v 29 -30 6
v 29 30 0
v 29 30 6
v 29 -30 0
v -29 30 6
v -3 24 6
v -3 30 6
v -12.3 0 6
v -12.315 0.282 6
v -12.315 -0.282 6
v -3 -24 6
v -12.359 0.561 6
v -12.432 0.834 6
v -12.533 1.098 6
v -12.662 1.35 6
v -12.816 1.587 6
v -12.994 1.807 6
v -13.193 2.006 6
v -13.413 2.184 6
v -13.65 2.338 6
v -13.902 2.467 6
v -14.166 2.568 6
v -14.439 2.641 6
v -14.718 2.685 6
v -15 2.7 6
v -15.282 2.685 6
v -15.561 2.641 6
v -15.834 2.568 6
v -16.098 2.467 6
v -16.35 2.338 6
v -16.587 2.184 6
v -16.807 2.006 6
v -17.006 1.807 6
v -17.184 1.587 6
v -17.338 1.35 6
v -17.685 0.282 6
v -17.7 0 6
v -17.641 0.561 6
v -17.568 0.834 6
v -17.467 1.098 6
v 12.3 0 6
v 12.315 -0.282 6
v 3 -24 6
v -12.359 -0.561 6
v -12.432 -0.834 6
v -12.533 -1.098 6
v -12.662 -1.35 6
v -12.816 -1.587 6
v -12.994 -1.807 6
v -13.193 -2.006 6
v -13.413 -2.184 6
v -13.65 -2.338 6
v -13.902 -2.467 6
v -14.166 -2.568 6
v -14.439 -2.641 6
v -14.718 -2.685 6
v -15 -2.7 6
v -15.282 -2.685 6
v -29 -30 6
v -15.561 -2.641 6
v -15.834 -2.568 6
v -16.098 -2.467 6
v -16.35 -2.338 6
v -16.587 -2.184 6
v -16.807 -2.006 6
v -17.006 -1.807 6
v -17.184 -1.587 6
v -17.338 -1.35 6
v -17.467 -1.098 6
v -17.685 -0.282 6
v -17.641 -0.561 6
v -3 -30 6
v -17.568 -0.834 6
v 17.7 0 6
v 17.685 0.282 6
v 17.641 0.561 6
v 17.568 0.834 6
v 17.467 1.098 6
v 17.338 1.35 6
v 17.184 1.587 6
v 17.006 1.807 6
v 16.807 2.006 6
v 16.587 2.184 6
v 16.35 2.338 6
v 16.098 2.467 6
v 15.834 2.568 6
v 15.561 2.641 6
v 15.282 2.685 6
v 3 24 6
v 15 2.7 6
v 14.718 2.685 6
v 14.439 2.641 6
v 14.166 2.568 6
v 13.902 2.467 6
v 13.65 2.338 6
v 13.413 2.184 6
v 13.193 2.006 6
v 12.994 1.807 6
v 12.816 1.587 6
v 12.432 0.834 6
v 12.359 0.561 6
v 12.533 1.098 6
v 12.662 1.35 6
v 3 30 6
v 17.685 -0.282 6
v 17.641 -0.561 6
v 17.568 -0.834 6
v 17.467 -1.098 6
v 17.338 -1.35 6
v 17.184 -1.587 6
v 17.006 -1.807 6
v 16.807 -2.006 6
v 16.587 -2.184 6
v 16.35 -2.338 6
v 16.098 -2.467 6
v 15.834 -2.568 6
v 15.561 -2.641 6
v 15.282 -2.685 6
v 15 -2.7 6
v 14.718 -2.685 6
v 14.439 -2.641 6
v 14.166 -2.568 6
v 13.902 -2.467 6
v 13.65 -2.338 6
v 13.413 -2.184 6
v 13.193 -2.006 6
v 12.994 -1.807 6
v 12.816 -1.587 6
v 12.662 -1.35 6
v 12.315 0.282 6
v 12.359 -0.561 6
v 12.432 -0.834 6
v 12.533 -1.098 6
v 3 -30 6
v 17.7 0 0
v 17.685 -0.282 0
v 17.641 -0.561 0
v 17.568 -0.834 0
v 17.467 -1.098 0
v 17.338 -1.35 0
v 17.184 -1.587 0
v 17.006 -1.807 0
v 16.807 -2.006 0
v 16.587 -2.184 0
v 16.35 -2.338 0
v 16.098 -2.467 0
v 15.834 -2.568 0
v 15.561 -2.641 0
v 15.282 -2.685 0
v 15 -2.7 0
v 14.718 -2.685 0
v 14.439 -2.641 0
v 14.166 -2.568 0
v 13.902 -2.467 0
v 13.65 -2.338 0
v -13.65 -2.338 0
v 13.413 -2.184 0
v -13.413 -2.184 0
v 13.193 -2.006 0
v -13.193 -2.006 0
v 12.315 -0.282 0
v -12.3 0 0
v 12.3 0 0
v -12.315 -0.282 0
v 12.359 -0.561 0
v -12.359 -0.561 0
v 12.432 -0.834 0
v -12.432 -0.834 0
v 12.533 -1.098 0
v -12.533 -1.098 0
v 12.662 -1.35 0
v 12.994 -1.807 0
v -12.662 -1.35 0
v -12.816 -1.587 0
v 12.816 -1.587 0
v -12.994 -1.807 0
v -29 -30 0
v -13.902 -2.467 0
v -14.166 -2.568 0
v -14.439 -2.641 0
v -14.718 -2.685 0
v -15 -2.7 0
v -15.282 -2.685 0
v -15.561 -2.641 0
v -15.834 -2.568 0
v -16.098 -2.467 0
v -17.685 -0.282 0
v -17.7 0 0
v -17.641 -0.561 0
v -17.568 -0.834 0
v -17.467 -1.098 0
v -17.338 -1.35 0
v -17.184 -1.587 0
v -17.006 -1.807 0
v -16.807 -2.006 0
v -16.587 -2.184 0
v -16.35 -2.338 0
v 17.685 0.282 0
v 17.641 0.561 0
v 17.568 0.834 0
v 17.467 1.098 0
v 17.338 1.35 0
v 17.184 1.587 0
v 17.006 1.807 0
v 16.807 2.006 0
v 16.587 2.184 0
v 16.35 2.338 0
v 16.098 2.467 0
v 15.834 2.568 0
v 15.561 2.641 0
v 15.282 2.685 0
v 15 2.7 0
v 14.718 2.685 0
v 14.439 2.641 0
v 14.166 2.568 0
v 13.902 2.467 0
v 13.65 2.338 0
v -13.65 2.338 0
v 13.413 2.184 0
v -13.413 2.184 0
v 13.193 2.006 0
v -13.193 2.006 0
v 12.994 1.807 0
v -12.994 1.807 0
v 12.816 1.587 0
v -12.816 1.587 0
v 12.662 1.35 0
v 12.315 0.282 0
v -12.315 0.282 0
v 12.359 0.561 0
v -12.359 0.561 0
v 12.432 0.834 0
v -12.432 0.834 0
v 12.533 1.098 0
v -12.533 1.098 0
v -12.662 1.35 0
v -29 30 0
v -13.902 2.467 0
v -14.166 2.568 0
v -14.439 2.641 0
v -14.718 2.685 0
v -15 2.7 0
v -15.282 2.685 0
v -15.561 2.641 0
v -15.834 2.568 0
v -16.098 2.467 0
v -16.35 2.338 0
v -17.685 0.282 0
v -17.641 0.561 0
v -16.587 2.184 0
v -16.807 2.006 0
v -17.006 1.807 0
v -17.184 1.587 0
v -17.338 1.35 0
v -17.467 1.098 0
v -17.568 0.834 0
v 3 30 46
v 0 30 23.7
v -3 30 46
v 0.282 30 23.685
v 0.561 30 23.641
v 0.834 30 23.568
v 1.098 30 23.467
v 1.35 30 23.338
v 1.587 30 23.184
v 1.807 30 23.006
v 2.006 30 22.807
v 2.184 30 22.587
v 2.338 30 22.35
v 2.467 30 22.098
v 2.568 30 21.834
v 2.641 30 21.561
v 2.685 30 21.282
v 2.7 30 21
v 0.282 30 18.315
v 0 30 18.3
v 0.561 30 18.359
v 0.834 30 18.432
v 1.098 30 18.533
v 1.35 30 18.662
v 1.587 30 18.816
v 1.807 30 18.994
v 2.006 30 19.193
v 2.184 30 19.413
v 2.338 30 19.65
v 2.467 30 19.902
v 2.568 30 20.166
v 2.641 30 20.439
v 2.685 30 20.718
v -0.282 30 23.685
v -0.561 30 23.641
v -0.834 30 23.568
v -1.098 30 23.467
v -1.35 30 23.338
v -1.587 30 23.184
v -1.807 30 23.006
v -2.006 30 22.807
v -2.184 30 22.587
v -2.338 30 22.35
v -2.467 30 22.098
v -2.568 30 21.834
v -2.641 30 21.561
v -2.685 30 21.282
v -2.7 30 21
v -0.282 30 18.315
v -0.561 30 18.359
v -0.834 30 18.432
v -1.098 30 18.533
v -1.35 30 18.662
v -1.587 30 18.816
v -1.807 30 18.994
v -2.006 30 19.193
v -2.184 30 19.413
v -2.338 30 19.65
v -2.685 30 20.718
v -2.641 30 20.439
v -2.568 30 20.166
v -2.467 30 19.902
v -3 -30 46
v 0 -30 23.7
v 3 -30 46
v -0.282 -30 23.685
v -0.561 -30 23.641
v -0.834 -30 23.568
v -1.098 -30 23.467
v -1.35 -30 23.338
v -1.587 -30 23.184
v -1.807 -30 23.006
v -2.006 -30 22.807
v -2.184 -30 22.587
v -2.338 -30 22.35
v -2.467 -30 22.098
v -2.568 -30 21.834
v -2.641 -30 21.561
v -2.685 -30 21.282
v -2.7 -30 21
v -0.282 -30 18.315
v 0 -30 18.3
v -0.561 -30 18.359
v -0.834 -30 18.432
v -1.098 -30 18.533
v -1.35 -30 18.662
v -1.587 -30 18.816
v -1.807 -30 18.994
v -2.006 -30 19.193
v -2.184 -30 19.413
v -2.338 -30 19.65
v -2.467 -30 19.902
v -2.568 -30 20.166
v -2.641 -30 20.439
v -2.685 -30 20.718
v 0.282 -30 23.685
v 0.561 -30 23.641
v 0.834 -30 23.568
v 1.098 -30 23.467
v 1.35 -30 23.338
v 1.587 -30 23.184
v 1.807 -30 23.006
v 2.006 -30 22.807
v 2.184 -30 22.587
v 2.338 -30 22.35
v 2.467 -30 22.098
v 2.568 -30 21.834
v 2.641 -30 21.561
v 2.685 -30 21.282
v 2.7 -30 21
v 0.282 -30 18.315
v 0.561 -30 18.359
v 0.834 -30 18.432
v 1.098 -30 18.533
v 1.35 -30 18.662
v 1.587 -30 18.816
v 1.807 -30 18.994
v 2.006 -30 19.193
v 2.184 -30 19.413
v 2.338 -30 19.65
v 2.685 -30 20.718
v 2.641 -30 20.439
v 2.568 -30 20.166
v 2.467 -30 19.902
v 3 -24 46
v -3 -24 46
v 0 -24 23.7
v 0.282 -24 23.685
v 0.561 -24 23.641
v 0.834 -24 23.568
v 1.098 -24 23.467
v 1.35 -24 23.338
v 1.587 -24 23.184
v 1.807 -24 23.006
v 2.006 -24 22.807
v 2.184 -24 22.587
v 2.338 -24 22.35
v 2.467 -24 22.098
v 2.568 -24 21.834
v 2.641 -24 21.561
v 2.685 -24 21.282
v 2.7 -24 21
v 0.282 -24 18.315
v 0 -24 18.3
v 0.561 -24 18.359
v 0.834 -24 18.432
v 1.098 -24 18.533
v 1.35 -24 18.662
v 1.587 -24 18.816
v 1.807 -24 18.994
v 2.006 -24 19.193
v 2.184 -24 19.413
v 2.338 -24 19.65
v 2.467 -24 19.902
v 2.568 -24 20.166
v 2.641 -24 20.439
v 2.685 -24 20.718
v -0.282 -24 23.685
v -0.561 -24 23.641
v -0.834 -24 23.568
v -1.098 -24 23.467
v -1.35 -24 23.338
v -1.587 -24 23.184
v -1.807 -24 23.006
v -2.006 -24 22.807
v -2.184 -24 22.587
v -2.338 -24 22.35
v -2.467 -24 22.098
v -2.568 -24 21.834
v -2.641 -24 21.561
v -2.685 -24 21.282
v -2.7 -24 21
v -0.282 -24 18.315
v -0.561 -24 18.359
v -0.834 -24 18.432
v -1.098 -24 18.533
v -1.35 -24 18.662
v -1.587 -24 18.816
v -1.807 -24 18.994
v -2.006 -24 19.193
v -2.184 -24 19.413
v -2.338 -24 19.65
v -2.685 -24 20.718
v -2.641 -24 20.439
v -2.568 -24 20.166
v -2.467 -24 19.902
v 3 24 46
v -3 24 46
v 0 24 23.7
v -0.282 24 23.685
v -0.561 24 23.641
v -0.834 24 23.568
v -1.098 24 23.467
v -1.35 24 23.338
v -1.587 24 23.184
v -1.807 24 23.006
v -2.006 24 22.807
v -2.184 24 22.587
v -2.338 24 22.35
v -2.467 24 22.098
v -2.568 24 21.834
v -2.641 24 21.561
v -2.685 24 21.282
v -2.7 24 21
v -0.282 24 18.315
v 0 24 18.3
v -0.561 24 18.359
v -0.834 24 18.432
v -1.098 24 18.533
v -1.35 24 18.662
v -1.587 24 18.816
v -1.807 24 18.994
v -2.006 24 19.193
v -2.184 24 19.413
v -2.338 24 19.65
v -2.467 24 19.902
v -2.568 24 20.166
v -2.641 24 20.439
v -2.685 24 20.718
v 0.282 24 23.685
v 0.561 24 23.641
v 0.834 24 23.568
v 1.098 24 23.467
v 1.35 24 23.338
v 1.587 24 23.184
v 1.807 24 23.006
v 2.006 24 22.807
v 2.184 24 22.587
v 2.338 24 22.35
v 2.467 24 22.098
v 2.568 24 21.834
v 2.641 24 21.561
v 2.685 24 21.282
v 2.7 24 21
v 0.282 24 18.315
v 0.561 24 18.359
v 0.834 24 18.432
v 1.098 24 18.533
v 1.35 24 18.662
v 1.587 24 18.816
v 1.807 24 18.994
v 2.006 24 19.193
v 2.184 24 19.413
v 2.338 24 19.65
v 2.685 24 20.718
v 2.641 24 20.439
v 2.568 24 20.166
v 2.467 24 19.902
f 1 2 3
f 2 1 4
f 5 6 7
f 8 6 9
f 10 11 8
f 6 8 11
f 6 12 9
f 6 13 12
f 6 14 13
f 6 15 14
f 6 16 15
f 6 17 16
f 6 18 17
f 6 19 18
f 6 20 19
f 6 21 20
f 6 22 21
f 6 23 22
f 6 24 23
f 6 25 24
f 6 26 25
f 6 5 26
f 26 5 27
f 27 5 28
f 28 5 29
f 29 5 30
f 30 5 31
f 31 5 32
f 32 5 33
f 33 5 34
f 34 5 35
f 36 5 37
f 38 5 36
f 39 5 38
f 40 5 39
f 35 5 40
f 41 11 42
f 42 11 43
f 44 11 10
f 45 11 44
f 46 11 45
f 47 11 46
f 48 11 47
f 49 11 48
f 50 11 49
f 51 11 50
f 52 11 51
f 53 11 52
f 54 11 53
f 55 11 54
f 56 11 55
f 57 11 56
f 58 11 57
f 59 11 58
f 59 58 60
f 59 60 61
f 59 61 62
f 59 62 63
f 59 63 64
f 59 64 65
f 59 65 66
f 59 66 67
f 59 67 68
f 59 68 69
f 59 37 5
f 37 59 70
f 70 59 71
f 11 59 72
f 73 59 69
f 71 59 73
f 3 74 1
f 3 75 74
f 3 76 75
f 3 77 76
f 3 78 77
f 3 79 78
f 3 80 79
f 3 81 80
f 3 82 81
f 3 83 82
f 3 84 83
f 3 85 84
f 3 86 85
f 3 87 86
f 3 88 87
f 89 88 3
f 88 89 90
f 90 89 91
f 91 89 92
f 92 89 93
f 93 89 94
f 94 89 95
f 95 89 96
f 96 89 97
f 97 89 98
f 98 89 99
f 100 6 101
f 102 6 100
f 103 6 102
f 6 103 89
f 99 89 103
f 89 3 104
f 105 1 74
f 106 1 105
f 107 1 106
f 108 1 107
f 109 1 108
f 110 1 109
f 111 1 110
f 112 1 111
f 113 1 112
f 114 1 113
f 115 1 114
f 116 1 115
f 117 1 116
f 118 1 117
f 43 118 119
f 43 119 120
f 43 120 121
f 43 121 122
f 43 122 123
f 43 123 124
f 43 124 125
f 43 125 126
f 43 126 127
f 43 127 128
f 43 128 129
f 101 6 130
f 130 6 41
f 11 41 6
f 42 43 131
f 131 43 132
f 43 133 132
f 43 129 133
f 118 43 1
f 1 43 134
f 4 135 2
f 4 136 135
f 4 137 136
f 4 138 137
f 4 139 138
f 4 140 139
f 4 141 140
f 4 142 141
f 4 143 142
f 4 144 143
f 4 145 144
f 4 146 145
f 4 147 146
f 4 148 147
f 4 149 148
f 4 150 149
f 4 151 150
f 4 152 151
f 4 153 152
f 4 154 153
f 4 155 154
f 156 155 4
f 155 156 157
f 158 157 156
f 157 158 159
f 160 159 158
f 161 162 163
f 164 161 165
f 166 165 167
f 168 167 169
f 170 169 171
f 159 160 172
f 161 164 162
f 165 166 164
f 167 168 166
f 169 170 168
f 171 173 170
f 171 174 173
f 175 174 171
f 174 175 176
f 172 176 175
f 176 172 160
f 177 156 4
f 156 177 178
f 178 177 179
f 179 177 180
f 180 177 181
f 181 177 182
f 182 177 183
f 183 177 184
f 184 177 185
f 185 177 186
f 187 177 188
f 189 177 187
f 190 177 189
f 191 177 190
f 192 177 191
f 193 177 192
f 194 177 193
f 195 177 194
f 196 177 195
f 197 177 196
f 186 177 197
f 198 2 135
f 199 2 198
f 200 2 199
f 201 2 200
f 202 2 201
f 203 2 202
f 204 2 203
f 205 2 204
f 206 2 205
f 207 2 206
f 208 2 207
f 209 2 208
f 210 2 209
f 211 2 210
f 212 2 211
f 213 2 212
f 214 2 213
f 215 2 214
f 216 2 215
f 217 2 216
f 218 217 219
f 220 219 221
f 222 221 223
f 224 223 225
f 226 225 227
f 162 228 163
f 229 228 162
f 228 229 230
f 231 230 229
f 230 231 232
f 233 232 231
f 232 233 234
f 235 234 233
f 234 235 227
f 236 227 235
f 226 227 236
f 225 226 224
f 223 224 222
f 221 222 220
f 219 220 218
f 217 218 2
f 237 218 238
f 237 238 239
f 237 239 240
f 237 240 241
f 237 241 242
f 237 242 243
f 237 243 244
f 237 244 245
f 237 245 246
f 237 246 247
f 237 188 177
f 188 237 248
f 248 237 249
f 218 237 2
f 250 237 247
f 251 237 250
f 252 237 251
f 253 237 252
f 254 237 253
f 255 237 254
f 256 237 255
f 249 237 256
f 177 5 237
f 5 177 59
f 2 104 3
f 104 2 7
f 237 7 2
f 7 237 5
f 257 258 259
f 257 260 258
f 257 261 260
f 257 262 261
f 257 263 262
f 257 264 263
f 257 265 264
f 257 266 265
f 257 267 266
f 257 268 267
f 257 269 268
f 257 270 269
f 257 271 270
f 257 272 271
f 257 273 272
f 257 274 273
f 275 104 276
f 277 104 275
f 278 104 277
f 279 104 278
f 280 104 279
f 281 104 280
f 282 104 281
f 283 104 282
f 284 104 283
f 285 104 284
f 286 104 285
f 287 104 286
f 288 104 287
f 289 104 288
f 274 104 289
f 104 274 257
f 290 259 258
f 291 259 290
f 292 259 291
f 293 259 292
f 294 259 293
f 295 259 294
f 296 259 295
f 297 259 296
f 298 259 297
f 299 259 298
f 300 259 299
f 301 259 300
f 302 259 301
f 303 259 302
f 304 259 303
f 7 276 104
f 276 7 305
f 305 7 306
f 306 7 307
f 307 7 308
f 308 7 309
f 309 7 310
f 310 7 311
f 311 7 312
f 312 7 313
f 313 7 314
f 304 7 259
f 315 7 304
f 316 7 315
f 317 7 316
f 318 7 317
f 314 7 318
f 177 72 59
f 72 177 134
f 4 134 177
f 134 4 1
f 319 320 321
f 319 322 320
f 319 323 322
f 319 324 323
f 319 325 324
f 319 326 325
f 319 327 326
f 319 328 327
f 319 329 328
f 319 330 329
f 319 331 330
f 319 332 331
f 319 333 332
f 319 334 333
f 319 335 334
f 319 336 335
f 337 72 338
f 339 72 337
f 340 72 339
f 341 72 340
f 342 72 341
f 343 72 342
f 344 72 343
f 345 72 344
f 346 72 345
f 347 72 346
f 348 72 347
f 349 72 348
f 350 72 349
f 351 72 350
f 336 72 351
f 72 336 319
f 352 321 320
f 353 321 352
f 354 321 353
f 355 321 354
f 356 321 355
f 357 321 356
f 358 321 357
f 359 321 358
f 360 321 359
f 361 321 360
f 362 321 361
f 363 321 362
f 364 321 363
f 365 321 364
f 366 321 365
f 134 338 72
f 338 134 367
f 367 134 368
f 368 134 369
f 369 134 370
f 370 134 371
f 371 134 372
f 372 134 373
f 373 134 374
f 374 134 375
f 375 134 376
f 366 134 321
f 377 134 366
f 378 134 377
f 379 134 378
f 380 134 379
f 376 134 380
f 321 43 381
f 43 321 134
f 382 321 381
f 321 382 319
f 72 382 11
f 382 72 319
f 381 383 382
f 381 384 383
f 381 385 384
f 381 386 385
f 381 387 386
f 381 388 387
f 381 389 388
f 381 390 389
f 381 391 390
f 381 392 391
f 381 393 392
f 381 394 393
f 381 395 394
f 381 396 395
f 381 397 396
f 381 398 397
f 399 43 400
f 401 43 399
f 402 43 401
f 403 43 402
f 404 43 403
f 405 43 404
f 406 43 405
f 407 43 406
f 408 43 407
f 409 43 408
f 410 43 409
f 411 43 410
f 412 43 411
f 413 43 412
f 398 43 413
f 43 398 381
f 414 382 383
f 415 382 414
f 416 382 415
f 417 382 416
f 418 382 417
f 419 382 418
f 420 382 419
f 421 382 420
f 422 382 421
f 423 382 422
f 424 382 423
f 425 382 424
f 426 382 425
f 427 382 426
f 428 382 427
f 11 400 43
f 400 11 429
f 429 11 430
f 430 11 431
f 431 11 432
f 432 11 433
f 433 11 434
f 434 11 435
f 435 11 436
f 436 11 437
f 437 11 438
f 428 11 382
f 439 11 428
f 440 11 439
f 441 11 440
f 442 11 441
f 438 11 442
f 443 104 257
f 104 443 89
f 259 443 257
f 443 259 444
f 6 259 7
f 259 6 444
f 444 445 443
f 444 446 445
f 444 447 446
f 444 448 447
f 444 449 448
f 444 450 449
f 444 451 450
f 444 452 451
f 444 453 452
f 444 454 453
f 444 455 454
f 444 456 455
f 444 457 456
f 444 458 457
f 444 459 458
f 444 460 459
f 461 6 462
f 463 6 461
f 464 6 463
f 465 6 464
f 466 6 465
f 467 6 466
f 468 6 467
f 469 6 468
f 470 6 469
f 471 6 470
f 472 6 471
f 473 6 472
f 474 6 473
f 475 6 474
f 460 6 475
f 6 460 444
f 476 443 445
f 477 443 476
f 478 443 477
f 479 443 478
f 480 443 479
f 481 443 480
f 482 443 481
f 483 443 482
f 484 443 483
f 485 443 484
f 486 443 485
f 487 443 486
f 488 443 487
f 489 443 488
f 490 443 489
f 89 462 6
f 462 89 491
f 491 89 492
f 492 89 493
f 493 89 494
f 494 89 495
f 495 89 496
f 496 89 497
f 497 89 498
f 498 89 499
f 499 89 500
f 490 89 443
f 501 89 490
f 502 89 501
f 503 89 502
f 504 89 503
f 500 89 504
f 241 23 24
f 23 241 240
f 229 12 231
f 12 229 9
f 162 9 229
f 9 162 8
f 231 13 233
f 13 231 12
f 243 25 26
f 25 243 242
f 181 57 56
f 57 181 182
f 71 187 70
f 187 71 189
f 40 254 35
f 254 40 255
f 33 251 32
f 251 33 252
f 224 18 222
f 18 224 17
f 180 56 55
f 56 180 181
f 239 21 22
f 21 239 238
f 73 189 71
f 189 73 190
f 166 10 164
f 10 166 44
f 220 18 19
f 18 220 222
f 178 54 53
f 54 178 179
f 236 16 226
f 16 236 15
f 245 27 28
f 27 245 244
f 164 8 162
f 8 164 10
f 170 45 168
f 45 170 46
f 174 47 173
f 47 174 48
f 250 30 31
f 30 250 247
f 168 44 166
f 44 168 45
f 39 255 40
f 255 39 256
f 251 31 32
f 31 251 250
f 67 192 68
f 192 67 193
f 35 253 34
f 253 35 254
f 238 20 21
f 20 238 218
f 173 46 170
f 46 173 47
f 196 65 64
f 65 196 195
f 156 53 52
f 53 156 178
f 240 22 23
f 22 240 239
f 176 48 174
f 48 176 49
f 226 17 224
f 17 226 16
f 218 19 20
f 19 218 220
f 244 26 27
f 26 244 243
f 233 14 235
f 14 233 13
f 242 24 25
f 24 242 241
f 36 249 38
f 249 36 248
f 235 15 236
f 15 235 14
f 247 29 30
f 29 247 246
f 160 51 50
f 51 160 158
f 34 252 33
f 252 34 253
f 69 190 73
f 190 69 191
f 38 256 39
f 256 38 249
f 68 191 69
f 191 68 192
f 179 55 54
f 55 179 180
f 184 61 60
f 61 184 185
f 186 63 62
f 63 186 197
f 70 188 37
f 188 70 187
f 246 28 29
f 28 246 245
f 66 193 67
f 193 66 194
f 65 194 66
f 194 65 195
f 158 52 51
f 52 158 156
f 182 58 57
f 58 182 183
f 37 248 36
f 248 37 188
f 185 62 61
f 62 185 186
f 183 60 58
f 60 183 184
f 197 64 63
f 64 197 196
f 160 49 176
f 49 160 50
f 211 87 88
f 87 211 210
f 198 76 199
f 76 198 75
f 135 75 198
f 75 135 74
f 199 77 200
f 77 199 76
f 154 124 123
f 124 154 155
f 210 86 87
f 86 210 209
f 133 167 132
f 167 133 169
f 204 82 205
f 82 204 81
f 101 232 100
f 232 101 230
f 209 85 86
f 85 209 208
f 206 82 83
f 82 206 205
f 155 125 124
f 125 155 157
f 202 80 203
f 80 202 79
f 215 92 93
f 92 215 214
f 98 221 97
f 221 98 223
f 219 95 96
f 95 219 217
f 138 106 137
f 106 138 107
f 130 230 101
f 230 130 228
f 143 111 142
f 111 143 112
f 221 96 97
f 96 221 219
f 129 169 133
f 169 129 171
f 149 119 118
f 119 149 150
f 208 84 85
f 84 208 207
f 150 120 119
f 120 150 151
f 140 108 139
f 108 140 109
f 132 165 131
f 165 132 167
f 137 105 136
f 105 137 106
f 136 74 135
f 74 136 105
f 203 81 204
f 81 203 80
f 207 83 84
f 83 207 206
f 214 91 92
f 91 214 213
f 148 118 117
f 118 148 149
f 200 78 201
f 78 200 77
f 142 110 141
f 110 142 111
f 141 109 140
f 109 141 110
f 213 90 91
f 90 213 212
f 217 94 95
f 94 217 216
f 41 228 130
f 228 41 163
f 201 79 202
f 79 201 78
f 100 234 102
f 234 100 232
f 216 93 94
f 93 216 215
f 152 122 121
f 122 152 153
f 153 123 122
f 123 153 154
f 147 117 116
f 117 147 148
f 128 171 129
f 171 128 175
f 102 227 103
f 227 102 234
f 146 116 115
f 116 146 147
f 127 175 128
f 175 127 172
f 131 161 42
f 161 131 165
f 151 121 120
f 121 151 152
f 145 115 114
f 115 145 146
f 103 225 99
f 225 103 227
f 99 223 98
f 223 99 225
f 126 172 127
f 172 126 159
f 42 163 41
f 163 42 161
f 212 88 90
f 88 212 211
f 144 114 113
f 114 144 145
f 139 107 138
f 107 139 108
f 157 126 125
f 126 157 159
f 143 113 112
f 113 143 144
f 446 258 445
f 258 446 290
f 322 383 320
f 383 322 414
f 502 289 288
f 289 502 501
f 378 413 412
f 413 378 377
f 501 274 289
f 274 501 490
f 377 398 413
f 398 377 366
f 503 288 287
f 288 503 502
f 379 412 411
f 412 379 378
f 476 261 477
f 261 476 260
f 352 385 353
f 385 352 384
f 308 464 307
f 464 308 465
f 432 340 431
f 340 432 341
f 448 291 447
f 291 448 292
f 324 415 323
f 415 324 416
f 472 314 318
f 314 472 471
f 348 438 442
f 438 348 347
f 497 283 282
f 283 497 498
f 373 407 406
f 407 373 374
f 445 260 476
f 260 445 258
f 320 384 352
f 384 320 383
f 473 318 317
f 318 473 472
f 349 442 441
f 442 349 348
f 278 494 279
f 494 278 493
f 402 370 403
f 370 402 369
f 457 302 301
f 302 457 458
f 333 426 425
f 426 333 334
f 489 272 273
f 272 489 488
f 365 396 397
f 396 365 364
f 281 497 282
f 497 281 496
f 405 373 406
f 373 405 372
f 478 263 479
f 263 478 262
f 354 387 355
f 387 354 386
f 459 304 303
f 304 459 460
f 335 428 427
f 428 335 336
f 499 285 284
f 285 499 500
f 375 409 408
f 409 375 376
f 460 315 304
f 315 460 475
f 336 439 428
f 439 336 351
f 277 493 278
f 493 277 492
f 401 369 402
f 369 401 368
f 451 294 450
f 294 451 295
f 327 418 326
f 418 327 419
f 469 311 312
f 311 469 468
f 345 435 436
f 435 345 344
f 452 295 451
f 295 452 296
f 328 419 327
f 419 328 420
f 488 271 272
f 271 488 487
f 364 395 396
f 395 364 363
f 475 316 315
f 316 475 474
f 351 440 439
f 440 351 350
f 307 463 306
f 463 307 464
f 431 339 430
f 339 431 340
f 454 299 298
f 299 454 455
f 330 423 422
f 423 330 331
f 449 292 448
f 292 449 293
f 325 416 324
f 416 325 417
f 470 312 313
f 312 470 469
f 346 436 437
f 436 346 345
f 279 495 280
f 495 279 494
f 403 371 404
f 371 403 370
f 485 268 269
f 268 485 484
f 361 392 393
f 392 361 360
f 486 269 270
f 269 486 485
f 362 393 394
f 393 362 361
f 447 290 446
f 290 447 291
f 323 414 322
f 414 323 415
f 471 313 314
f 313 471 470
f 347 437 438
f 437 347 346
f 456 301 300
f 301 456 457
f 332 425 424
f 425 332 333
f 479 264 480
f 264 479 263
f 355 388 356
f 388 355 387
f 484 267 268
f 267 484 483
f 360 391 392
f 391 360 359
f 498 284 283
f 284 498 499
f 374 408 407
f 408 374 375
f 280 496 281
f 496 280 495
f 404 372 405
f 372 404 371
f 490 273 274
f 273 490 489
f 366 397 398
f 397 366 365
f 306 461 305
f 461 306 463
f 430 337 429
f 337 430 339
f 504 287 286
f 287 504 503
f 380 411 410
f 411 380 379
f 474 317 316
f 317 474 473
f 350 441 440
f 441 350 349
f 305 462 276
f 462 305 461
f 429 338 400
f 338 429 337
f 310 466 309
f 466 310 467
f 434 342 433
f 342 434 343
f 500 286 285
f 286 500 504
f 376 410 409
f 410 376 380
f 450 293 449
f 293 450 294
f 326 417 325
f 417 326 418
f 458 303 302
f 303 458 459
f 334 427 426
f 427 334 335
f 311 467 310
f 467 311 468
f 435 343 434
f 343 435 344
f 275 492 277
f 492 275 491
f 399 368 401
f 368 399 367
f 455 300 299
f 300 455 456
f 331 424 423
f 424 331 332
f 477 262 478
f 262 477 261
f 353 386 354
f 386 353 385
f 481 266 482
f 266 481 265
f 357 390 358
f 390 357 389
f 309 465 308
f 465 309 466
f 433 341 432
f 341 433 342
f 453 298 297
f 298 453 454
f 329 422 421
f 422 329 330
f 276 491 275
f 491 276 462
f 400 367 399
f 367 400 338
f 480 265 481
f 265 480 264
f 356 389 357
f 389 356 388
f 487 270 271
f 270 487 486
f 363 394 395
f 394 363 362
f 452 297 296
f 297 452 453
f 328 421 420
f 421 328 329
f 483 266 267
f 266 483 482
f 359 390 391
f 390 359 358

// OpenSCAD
// Clevis mounting bracket for M5 pin.
$fn = 60;
eps = 0.02;
opening = 48;
ear_h = 42;
base_l = 58;
base_w = opening + 12;
base_t = 6;
ear_t = 6;
difference() {
    union() {
        translate([-base_l / 2, -base_w / 2, 0]) cube([base_l, base_w, base_t]);
        translate([-ear_t / 2, -base_w / 2, base_t - 2]) cube([ear_t, ear_t, ear_h]);
        translate([-ear_t / 2, base_w / 2 - ear_t, base_t - 2]) cube([ear_t, ear_t, ear_h]);
    }
    for (x = [-15, 15]) translate([x, 0, -eps]) cylinder(d = 5.4, h = base_t + 2 * eps);
    translate([0, -base_w / 2 - eps, ear_h / 2]) rotate([-90, 0, 0]) cylinder(d = 5.4, h = base_w + 2 * eps);
}
